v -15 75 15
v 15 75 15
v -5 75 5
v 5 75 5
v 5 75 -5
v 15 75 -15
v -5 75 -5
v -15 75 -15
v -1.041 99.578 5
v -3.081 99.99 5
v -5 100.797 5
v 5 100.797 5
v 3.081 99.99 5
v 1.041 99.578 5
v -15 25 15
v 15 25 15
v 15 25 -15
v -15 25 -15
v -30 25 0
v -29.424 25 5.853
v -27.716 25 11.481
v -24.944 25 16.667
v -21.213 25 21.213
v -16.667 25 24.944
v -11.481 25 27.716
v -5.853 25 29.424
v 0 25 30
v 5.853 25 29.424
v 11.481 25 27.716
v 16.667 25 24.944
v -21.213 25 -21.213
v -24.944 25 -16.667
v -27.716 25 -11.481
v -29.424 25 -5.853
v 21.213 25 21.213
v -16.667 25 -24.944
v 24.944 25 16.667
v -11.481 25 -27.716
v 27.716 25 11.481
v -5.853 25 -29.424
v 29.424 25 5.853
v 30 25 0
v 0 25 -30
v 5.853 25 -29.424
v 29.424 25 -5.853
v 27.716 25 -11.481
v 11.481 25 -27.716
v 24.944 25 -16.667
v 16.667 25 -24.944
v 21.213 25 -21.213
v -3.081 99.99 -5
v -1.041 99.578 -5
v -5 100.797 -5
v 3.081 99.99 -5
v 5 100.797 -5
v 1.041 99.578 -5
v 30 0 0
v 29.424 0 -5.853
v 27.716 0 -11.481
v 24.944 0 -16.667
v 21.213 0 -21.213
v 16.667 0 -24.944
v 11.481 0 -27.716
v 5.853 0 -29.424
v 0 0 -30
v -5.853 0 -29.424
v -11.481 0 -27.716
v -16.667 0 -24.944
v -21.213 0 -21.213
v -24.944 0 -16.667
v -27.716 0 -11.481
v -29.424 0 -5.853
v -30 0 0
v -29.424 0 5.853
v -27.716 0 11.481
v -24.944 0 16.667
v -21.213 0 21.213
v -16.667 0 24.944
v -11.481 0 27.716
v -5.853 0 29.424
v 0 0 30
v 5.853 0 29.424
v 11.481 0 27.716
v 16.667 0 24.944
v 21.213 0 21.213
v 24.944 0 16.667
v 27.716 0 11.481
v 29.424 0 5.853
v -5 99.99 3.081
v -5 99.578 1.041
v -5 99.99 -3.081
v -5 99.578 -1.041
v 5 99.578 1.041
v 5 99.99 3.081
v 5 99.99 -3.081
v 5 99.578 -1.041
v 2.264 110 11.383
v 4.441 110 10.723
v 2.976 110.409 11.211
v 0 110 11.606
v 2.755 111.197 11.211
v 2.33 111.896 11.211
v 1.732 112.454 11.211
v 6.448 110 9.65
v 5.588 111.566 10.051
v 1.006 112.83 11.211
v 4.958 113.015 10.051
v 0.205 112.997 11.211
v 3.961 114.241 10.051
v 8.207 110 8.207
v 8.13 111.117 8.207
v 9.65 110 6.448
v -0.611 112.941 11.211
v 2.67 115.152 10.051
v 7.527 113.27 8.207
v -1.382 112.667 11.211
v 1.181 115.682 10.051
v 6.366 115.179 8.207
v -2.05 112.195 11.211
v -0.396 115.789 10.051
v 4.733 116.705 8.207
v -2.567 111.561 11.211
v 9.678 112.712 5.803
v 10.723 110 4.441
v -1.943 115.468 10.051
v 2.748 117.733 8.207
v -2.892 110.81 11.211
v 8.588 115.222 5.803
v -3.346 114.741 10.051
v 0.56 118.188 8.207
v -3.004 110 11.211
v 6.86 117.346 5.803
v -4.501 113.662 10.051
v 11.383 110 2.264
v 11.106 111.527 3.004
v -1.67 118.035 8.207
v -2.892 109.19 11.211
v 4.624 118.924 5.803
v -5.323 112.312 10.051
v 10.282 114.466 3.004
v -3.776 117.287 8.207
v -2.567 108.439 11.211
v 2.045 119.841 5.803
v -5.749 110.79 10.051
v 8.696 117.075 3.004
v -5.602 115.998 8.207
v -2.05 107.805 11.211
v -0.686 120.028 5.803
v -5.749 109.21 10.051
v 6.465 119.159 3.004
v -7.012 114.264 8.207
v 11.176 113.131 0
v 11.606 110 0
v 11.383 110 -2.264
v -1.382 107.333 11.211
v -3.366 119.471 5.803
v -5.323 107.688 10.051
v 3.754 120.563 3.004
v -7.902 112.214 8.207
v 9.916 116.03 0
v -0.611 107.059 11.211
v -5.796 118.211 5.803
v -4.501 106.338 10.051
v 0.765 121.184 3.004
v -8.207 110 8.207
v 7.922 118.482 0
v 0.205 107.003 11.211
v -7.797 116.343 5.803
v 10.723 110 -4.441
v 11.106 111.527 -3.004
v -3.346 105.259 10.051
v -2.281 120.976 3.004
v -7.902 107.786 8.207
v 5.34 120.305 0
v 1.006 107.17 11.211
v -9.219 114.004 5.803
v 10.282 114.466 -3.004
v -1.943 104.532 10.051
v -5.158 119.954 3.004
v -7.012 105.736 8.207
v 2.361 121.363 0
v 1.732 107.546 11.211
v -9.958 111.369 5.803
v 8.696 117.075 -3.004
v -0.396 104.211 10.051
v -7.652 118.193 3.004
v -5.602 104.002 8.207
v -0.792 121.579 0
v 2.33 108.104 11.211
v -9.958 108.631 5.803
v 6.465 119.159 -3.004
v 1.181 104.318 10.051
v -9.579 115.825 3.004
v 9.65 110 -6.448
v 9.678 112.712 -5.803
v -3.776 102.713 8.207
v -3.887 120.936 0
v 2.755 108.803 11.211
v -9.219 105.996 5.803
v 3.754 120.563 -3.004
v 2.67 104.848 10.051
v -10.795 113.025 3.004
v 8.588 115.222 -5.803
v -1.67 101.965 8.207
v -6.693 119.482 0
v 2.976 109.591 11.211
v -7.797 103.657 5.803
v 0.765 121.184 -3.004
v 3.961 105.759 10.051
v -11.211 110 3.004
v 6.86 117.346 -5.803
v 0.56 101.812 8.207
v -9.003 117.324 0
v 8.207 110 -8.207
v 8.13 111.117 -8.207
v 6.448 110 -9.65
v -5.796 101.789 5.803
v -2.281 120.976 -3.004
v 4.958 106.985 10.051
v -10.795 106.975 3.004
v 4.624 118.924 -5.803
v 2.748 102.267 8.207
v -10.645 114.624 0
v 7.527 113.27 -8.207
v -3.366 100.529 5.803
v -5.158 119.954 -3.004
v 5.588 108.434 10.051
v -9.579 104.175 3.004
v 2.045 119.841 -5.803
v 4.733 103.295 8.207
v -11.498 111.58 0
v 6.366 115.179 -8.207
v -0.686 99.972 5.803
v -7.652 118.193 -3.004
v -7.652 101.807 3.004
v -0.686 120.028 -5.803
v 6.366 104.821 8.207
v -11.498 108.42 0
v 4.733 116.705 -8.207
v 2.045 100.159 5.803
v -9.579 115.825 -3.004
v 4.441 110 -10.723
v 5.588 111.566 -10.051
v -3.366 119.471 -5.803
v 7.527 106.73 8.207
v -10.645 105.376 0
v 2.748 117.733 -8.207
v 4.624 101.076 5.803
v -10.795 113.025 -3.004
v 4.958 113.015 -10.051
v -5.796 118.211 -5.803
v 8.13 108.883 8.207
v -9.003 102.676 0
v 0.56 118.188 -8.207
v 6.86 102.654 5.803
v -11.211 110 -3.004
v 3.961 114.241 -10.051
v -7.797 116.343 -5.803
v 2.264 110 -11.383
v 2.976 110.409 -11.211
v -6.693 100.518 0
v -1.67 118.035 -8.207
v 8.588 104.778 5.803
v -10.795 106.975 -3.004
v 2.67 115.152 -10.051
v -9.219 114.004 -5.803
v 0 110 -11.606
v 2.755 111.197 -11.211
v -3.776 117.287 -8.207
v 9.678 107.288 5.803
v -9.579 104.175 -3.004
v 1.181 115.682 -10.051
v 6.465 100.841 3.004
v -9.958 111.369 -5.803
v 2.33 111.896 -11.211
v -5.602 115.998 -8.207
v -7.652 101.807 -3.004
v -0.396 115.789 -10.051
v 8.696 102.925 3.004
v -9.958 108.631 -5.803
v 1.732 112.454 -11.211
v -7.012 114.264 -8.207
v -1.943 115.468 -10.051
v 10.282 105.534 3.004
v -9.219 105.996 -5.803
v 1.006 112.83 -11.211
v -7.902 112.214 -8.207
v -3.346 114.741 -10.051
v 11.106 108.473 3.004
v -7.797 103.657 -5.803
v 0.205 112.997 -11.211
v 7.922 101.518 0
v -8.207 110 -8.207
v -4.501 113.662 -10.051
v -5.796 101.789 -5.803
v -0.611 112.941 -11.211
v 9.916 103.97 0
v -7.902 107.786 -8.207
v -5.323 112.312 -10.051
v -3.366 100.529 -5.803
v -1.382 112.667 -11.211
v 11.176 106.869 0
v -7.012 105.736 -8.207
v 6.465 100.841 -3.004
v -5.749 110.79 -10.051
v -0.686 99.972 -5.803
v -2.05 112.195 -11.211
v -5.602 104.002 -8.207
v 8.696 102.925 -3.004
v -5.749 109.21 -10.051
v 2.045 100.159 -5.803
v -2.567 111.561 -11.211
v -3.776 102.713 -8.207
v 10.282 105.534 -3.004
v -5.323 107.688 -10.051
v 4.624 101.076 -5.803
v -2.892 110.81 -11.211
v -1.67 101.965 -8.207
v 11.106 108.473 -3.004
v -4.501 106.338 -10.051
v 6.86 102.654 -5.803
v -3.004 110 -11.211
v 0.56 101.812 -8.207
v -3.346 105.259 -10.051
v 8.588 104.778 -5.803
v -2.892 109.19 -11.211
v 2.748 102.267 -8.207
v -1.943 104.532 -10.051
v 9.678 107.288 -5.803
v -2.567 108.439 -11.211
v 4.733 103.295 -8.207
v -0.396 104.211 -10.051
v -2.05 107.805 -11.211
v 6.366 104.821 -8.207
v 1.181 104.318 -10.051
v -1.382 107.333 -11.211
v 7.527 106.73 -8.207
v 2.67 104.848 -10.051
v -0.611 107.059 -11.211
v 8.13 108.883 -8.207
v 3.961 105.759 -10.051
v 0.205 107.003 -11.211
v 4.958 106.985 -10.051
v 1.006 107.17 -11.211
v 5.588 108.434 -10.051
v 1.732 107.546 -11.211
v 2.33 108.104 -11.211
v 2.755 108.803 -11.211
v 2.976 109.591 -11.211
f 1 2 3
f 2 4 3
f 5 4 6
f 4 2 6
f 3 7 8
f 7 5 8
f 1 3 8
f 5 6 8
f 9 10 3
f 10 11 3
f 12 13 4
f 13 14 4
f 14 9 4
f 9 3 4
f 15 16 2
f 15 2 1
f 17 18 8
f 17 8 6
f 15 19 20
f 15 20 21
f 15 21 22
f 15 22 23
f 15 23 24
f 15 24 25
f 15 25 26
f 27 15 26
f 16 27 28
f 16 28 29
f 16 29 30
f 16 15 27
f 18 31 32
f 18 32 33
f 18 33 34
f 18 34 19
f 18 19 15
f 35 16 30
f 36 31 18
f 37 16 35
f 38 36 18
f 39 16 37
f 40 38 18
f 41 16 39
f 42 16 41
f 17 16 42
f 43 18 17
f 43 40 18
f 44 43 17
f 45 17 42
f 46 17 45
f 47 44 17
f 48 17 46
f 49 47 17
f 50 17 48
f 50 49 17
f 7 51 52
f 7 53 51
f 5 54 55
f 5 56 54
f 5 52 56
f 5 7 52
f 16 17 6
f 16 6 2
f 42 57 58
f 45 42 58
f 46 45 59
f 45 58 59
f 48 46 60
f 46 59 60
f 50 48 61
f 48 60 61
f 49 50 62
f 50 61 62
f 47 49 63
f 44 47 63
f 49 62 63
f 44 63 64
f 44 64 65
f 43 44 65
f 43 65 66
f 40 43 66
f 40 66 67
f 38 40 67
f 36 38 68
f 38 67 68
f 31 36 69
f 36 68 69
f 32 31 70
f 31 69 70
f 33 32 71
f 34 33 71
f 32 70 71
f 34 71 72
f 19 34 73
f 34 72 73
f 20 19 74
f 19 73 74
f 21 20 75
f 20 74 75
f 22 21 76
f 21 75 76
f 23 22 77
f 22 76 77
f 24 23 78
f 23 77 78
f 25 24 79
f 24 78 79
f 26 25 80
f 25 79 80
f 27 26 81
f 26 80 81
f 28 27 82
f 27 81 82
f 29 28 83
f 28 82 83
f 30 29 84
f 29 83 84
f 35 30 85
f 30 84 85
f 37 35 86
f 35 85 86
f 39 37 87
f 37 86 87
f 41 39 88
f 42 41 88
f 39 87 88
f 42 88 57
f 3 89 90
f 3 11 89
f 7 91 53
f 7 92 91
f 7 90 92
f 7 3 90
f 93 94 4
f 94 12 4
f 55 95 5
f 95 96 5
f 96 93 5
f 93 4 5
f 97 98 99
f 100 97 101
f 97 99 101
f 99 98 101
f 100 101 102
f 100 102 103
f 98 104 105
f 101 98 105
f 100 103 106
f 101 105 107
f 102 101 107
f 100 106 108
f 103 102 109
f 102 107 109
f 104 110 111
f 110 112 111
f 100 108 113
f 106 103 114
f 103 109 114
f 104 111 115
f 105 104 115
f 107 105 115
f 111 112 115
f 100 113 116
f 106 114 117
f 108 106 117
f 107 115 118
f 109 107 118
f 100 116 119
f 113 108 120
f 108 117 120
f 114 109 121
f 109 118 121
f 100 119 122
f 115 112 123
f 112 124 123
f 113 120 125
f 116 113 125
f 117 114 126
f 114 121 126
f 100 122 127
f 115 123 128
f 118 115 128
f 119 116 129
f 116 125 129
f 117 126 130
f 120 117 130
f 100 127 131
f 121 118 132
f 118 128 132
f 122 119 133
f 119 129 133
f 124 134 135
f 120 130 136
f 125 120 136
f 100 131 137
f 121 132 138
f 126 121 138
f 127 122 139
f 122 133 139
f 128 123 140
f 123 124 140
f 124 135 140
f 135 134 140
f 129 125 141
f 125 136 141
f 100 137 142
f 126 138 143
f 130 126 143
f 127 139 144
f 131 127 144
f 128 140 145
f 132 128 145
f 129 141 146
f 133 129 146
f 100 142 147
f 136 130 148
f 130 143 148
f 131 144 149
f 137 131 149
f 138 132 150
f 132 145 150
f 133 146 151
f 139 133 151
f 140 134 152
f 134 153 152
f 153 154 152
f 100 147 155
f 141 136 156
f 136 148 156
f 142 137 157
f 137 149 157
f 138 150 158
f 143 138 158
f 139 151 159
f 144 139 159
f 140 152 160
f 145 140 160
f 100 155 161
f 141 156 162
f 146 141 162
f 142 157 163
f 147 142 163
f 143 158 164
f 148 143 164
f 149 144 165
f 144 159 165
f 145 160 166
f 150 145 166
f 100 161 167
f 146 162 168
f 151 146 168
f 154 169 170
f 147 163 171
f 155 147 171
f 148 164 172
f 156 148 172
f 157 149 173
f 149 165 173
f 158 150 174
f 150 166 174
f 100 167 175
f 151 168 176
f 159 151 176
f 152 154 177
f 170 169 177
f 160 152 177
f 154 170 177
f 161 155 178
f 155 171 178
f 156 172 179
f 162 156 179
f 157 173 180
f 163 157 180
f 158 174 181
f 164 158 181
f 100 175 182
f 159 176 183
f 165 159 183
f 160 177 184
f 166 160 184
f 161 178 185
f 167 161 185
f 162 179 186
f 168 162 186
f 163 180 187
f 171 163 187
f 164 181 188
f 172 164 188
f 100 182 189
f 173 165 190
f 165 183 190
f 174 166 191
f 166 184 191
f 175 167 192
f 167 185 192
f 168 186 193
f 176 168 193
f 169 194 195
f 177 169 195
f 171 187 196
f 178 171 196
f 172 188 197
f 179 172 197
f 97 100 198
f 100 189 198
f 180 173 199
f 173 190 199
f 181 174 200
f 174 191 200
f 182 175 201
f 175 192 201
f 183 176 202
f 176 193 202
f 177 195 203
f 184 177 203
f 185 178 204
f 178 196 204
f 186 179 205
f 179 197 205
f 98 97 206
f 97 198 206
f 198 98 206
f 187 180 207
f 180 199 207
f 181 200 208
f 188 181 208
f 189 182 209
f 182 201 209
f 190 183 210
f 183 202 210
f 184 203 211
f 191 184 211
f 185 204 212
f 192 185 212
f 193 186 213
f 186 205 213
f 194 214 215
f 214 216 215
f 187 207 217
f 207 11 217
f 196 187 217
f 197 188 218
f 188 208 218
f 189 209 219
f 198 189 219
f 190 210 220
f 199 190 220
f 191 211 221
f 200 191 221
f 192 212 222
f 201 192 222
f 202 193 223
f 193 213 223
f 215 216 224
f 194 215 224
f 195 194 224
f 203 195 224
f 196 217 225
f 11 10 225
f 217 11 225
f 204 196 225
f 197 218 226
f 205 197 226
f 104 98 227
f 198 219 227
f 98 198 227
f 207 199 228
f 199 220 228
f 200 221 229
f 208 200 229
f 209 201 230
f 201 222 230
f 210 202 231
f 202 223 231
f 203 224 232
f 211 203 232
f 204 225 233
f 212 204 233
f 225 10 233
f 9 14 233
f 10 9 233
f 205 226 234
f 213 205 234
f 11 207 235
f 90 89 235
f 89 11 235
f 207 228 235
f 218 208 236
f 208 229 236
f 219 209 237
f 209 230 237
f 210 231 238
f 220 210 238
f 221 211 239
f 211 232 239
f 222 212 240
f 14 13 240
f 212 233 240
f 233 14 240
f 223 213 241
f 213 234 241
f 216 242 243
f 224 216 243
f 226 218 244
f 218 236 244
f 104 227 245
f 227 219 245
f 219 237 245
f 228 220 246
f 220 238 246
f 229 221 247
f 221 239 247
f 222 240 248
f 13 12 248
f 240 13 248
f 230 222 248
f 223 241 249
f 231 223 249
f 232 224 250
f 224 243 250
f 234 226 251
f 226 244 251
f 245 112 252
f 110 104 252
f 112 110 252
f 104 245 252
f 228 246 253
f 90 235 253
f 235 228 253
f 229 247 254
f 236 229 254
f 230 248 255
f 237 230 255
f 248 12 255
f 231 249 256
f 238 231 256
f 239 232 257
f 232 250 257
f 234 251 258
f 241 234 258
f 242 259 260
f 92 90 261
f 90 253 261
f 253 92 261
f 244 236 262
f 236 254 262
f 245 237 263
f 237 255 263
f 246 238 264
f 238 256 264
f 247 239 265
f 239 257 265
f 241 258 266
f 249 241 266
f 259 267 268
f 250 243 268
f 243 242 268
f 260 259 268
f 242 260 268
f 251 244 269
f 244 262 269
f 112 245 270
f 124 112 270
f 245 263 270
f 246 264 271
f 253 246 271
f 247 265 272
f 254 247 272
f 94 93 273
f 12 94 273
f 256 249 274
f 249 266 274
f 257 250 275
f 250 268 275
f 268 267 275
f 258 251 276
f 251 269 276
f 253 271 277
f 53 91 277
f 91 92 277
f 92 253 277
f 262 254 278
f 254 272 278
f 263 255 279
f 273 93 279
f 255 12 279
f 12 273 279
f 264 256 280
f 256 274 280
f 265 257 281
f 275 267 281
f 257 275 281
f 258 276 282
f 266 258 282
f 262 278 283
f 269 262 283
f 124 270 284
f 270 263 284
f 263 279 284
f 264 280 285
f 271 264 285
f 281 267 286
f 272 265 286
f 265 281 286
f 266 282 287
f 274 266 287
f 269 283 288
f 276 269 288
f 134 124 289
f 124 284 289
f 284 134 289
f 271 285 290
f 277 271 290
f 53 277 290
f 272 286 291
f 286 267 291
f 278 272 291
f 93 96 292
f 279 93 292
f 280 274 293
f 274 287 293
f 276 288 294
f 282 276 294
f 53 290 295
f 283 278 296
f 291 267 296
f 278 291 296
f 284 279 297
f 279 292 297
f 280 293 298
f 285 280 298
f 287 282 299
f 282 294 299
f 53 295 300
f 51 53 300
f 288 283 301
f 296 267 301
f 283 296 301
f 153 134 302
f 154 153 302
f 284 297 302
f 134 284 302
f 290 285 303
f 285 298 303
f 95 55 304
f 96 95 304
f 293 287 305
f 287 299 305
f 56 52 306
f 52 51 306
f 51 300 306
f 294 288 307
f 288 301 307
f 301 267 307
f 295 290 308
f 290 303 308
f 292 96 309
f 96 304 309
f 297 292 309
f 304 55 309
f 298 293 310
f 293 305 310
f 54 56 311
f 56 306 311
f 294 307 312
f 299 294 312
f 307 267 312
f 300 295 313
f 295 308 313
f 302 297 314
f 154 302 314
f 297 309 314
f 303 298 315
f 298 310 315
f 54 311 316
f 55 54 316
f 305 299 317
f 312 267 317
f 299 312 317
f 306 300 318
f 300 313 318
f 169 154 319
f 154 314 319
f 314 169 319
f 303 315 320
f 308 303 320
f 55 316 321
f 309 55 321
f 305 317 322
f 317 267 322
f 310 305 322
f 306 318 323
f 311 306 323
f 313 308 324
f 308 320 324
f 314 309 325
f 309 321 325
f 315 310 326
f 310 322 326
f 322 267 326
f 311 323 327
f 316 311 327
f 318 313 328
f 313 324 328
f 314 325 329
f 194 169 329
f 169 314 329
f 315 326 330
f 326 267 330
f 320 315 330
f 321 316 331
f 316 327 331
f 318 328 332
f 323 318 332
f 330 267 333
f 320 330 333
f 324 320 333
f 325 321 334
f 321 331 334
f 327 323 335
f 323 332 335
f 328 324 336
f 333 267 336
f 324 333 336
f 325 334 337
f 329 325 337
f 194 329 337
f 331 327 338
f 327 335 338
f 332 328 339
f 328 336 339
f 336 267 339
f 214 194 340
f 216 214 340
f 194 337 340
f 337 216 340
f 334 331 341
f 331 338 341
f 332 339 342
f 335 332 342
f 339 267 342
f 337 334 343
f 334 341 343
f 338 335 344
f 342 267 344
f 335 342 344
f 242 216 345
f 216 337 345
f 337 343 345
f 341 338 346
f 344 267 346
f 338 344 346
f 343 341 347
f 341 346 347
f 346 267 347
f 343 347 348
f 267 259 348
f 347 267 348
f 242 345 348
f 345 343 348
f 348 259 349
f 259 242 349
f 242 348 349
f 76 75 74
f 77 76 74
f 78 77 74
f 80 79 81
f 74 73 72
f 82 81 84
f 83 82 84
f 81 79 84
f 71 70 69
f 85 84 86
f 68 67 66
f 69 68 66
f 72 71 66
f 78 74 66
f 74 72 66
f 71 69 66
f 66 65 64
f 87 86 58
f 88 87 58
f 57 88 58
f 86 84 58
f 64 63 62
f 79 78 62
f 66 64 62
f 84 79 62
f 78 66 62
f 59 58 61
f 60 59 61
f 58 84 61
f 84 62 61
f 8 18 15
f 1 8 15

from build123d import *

# Parameters (mm, degrees)
SKETCH1_R           = 30
BOSS_EXTRUDE1_DEPTH = 25
BOSS_EXTRUDE2_DEPTH = 50
SKETCH4_W           = 10
SKETCH4_H           = 10
BOSS_EXTRUDE3_DEPTH = 30


with BuildPart() as part:
    # Sketch1 → Boss-Extrude1 (new body)
    with BuildSketch(Plane(origin=(0, 0, 0), x_dir=(1, 0, 0), z_dir=(0, 1, 0))):
        Circle(SKETCH1_R)
    extrude(amount=BOSS_EXTRUDE1_DEPTH)

    # Sketch3 → Boss-Extrude2 (add)
    with BuildSketch(Plane(origin=(0, 25, 0), x_dir=(1, 0, 0), z_dir=(0, 1, 0))):
        Polygon((-15, 0.769018566), (-15, 15), (15, 15), (15, -15), (-15, -15), align=None)
    extrude(amount=BOSS_EXTRUDE2_DEPTH)

    # Sketch4 → Boss-Extrude3 (add)
    with BuildSketch(Plane(origin=(0, 75, 0), x_dir=(1, 0, 0), z_dir=(0, 1, 0))):
        Rectangle(SKETCH4_W, SKETCH4_H)
    extrude(amount=BOSS_EXTRUDE3_DEPTH)

    # Sketch7 → Revolve1 (revolve)
    with BuildSketch(Plane(origin=(0, 110, 0), x_dir=(1, 0, 0), z_dir=(0, 1, 0))):
        with BuildLine():
            Line((0, 11.606043258), (0, -11.606043258))
            ThreePointArc((0, -11.606043258), (11.606043258, 0), (0, 11.606043258))
        make_face()
    revolve(axis=Axis((0, 110, -11.606043258), (0, 0, 1)))


solid = part.part
